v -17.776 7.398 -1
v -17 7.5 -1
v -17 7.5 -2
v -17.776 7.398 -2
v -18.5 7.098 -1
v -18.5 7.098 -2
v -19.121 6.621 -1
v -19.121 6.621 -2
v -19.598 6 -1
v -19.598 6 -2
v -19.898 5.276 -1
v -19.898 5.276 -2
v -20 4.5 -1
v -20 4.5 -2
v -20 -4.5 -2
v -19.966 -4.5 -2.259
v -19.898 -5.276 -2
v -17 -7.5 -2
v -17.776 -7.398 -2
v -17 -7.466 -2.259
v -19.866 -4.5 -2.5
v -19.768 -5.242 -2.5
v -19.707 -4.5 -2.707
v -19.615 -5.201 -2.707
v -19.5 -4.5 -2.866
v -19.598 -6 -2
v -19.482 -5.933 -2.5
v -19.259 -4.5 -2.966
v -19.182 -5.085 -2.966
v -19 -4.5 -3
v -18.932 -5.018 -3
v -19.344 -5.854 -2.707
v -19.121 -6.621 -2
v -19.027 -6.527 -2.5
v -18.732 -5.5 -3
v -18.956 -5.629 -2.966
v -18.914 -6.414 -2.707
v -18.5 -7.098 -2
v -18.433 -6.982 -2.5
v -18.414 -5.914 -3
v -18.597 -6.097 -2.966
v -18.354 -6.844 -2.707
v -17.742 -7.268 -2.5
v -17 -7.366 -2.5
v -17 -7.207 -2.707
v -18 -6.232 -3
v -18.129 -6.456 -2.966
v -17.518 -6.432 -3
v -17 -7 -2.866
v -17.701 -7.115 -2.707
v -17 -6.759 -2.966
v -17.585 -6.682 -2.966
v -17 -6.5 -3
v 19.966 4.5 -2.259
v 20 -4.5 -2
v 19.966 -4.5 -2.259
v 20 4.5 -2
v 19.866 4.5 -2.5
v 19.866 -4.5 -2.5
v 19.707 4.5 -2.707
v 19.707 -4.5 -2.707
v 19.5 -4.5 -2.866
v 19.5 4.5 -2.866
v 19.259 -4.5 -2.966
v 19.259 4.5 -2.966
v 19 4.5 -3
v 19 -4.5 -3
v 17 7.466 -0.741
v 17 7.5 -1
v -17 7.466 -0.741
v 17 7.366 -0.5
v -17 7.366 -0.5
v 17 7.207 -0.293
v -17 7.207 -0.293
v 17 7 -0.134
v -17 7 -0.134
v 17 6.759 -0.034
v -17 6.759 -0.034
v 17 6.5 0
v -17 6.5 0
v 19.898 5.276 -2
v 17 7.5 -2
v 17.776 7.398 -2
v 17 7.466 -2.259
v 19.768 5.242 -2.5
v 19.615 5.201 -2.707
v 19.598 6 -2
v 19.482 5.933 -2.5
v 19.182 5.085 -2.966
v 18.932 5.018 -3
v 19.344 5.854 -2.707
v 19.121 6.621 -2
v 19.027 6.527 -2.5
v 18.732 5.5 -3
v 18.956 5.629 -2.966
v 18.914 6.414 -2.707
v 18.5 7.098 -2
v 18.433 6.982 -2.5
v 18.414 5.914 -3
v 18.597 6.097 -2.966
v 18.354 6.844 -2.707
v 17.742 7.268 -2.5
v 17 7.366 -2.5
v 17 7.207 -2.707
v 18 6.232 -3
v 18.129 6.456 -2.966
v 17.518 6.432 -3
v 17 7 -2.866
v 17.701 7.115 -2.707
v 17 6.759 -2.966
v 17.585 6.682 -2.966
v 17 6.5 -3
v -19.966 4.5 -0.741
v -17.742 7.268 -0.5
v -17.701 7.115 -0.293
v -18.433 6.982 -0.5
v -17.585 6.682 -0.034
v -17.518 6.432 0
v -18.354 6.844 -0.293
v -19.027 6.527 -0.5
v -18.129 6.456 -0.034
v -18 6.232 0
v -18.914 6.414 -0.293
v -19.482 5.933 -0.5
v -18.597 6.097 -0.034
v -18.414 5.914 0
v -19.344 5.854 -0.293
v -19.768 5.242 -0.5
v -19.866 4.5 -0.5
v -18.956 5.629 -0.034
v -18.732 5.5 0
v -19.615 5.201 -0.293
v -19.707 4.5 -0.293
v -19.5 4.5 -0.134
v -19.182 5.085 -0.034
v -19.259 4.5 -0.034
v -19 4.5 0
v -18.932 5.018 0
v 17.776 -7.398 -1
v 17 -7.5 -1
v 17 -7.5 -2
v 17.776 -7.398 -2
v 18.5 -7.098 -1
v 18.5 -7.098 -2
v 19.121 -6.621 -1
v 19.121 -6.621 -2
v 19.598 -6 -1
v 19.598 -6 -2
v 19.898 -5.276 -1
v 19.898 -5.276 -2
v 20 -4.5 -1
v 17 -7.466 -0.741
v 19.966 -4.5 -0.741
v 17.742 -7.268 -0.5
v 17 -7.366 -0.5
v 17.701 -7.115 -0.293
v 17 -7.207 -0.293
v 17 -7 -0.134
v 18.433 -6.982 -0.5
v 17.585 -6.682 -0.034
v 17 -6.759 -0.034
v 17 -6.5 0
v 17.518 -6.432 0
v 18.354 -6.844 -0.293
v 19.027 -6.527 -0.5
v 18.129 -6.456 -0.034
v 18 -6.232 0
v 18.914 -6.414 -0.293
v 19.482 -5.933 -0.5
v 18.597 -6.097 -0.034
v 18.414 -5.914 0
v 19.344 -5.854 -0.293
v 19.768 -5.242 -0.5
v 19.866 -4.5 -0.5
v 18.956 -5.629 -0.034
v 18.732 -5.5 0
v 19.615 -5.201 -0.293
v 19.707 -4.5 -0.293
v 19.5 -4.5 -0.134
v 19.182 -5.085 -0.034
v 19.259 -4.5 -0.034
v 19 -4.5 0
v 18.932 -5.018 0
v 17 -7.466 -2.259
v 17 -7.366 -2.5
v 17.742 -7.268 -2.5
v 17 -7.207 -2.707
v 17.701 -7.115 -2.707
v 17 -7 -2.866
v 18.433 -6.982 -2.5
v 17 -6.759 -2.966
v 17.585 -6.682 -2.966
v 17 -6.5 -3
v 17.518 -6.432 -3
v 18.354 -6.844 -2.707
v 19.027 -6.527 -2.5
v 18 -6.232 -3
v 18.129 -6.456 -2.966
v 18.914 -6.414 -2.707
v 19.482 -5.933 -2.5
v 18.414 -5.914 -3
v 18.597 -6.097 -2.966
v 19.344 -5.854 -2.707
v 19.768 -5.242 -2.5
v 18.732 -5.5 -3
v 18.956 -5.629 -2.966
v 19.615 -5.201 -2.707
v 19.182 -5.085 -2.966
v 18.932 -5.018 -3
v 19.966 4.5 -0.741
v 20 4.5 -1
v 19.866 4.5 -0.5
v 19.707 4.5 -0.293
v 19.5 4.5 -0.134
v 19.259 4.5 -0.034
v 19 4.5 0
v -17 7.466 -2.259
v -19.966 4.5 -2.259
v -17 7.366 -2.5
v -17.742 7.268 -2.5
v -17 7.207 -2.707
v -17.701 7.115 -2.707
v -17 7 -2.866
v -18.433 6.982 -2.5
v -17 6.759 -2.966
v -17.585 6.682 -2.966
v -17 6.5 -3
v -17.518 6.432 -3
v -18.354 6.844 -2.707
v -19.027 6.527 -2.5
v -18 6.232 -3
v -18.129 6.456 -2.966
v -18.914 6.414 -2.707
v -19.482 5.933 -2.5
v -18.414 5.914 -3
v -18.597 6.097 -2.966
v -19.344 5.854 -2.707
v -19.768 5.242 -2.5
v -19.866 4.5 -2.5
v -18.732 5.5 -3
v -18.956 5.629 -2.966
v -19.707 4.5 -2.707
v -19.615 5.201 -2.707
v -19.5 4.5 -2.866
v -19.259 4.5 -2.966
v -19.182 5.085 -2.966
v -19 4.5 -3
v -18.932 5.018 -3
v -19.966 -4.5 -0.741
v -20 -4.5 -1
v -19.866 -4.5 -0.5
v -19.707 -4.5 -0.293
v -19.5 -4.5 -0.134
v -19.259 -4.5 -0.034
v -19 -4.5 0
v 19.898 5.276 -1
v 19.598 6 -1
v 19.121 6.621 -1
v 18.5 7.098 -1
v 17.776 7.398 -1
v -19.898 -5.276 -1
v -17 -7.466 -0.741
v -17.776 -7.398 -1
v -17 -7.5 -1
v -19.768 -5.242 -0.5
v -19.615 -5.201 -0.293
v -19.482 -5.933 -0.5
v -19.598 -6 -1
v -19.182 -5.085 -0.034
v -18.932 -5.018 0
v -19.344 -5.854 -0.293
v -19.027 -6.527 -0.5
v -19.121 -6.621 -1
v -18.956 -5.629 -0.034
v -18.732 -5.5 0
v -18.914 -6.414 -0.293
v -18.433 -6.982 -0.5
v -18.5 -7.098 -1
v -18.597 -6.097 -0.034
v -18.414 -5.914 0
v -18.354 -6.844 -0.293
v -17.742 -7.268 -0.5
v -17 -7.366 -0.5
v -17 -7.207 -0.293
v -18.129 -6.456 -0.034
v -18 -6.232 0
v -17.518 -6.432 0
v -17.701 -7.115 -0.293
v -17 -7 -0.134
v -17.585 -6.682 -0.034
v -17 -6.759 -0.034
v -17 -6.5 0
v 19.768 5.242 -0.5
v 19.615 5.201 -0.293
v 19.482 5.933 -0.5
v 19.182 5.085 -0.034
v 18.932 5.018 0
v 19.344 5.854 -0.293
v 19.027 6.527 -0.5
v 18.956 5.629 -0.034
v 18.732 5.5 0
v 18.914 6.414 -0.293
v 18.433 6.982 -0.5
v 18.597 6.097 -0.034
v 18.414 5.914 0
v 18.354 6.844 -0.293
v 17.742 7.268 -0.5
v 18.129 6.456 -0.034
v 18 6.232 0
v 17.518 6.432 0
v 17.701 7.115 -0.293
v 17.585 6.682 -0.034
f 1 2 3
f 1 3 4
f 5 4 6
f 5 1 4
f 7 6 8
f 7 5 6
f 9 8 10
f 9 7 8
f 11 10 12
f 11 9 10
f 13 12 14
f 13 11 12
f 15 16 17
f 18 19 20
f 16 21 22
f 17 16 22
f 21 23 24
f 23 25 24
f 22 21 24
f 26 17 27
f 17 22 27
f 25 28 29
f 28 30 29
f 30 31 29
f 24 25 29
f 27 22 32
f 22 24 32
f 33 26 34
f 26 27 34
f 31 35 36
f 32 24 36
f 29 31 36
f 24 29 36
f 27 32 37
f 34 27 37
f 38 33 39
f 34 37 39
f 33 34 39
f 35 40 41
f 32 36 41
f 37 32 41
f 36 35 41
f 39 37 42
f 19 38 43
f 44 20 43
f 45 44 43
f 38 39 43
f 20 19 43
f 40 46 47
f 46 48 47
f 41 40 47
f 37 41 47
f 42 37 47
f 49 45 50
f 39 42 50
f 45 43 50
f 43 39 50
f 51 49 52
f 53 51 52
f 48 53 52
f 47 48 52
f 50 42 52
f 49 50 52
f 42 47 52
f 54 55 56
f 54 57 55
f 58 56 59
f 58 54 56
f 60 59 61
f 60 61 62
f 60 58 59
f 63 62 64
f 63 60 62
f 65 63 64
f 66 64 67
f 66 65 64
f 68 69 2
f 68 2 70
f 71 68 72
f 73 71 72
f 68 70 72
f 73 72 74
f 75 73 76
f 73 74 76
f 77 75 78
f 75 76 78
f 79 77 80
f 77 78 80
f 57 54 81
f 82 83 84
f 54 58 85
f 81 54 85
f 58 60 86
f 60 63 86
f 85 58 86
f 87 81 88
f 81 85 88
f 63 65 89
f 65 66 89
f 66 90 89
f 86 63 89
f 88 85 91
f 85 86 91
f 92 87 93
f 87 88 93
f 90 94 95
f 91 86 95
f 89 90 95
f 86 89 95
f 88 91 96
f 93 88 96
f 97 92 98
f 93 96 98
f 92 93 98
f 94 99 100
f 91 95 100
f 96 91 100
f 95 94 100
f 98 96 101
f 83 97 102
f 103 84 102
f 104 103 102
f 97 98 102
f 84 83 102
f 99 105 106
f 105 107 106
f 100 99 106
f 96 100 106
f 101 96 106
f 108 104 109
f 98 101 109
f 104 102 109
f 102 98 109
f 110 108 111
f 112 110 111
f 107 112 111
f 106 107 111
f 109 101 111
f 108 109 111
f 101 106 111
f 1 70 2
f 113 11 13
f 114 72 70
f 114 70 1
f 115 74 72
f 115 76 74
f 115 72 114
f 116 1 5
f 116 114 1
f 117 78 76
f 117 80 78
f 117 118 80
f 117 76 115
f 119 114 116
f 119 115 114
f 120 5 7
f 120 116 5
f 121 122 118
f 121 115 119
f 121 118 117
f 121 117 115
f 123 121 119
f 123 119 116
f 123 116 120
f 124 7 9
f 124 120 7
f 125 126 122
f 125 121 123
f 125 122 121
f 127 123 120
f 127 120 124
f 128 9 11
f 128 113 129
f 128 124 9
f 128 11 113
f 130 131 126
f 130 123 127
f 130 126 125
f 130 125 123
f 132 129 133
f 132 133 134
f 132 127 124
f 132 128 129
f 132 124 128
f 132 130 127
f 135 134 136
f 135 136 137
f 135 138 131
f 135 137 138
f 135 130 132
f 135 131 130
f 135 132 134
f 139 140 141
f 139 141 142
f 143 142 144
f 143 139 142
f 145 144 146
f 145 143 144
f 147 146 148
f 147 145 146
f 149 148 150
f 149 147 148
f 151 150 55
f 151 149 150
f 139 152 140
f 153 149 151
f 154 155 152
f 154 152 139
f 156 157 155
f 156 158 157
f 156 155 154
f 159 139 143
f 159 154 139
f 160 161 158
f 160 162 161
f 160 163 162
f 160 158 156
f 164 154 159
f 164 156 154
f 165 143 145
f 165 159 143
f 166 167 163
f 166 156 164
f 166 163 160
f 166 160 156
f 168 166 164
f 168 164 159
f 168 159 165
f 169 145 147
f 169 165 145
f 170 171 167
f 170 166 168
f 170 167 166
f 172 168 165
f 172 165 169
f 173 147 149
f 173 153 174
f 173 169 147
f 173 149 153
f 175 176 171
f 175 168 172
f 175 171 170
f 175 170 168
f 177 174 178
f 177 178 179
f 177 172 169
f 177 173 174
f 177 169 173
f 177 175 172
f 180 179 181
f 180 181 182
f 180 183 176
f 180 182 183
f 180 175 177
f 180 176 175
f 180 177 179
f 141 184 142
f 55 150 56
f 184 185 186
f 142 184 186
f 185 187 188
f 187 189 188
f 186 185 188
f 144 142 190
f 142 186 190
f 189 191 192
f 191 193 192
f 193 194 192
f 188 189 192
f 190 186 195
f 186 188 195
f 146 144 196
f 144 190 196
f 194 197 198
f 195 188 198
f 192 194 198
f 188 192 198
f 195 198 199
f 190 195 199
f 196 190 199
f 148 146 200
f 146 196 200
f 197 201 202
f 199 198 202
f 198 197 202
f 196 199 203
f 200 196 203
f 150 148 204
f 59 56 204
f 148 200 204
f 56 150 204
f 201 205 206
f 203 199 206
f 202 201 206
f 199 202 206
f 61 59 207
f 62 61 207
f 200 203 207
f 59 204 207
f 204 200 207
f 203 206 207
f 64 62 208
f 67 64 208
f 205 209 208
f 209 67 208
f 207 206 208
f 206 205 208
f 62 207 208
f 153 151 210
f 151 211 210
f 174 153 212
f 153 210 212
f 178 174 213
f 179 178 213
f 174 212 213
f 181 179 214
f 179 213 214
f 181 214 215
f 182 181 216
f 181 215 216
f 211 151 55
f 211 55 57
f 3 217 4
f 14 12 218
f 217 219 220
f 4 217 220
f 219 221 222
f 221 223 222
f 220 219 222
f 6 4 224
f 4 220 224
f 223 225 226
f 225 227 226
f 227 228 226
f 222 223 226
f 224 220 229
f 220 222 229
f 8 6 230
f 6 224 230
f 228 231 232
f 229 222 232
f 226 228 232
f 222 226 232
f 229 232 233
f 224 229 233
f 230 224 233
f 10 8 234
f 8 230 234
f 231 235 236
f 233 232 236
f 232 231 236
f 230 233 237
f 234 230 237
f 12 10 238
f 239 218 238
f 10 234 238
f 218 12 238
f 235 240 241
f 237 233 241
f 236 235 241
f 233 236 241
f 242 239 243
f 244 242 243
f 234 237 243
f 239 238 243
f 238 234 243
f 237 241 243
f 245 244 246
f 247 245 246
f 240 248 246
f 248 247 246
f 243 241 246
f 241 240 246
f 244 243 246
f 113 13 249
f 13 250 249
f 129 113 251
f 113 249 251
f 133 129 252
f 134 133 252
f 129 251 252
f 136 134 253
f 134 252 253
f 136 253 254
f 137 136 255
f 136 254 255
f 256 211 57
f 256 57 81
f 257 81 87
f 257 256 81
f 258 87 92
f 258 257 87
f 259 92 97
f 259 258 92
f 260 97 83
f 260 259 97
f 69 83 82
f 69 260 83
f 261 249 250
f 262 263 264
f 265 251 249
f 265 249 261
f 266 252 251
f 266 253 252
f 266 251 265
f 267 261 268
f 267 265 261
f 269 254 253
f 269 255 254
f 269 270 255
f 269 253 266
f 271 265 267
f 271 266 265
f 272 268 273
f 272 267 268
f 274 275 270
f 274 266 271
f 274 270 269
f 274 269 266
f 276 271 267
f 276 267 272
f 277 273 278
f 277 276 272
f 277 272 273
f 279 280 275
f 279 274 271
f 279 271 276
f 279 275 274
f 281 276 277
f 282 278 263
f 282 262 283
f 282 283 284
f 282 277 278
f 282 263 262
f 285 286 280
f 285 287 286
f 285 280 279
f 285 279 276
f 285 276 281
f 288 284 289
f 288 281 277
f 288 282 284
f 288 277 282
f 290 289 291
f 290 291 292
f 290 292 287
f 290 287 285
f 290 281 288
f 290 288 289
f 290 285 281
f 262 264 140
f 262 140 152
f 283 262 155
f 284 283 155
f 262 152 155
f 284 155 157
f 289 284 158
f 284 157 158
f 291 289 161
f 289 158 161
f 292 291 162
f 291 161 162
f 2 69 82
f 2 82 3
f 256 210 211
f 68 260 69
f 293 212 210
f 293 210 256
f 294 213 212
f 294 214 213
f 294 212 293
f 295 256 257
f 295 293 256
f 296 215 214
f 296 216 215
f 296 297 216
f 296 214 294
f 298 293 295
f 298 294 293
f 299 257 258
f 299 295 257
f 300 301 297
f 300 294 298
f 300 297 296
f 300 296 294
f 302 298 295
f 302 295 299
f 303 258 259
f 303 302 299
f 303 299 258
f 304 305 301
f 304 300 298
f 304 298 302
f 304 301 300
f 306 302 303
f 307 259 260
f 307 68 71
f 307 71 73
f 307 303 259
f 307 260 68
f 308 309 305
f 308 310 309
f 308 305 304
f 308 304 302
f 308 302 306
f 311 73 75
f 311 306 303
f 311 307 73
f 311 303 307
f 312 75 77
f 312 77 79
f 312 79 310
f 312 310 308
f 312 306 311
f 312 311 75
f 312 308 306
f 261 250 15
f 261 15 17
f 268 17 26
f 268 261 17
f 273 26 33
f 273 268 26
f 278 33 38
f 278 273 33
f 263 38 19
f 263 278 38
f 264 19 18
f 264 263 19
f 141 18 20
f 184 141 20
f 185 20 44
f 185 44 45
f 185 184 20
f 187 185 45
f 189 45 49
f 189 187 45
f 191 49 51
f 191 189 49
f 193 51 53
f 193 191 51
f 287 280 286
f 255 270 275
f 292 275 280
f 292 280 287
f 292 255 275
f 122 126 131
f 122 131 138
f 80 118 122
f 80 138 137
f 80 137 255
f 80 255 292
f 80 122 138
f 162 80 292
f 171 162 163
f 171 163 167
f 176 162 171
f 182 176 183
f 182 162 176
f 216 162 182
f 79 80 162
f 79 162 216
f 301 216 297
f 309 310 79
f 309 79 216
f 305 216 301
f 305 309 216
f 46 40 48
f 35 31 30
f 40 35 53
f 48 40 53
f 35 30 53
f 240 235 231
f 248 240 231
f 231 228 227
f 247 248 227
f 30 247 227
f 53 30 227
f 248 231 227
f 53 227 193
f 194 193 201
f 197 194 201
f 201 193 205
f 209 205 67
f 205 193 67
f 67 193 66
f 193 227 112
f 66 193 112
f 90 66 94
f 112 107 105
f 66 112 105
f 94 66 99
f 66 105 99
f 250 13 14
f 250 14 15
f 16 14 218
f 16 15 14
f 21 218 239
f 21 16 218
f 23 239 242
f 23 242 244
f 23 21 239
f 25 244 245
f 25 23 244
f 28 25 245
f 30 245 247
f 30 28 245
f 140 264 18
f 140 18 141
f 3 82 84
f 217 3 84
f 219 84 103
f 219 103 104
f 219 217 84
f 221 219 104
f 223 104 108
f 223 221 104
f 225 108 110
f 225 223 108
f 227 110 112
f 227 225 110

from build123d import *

# Parameters (mm, degrees)
F1_DEPTH = 3
F2_R     = 1


with BuildPart() as f1:
    # F0 (on Top) → F1 (new body)
    with BuildSketch(Plane.XY):
        with BuildLine():
            ThreePointArc((20, 4.5), (19.12132, 6.62132), (17, 7.5))
            Line((17, 7.5), (-17, 7.5))
            ThreePointArc((-17, 7.5), (-19.12132, 6.62132), (-20, 4.5))
            Line((-20, 4.5), (-20, -4.5))
            ThreePointArc((-20, -4.5), (-19.12132, -6.62132), (-17, -7.5))
            Line((-17, -7.5), (17, -7.5))
            ThreePointArc((17, -7.5), (19.12132, -6.62132), (20, -4.5))
            Line((20, -4.5), (20, 4.5))
        make_face()
    extrude(amount=-F1_DEPTH)

    # F2
    f2_edges = [f1.edges().sort_by_distance(p)[0] for p in [
        (19.12132, -6.62132, 0),
        (20, 0, 0),
        (19.12132, 6.62132, 0),
        (0, 7.5, 0),
        (-19.12132, 6.62132, 0),
        (-20, 0, 0),
        (-19.12132, -6.62132, 0),
        (0, -7.5, 0),
        (19.12132, -6.62132, -3),
        (20, 0, -3),
        (19.12132, 6.62132, -3),
        (0, 7.5, -3),
        (-19.12132, 6.62132, -3),
        (-20, 0, -3),
        (-19.12132, -6.62132, -3),
        (0, -7.5, -3),
    ]]
    fillet(f2_edges, radius=F2_R)


solid = f1.part
